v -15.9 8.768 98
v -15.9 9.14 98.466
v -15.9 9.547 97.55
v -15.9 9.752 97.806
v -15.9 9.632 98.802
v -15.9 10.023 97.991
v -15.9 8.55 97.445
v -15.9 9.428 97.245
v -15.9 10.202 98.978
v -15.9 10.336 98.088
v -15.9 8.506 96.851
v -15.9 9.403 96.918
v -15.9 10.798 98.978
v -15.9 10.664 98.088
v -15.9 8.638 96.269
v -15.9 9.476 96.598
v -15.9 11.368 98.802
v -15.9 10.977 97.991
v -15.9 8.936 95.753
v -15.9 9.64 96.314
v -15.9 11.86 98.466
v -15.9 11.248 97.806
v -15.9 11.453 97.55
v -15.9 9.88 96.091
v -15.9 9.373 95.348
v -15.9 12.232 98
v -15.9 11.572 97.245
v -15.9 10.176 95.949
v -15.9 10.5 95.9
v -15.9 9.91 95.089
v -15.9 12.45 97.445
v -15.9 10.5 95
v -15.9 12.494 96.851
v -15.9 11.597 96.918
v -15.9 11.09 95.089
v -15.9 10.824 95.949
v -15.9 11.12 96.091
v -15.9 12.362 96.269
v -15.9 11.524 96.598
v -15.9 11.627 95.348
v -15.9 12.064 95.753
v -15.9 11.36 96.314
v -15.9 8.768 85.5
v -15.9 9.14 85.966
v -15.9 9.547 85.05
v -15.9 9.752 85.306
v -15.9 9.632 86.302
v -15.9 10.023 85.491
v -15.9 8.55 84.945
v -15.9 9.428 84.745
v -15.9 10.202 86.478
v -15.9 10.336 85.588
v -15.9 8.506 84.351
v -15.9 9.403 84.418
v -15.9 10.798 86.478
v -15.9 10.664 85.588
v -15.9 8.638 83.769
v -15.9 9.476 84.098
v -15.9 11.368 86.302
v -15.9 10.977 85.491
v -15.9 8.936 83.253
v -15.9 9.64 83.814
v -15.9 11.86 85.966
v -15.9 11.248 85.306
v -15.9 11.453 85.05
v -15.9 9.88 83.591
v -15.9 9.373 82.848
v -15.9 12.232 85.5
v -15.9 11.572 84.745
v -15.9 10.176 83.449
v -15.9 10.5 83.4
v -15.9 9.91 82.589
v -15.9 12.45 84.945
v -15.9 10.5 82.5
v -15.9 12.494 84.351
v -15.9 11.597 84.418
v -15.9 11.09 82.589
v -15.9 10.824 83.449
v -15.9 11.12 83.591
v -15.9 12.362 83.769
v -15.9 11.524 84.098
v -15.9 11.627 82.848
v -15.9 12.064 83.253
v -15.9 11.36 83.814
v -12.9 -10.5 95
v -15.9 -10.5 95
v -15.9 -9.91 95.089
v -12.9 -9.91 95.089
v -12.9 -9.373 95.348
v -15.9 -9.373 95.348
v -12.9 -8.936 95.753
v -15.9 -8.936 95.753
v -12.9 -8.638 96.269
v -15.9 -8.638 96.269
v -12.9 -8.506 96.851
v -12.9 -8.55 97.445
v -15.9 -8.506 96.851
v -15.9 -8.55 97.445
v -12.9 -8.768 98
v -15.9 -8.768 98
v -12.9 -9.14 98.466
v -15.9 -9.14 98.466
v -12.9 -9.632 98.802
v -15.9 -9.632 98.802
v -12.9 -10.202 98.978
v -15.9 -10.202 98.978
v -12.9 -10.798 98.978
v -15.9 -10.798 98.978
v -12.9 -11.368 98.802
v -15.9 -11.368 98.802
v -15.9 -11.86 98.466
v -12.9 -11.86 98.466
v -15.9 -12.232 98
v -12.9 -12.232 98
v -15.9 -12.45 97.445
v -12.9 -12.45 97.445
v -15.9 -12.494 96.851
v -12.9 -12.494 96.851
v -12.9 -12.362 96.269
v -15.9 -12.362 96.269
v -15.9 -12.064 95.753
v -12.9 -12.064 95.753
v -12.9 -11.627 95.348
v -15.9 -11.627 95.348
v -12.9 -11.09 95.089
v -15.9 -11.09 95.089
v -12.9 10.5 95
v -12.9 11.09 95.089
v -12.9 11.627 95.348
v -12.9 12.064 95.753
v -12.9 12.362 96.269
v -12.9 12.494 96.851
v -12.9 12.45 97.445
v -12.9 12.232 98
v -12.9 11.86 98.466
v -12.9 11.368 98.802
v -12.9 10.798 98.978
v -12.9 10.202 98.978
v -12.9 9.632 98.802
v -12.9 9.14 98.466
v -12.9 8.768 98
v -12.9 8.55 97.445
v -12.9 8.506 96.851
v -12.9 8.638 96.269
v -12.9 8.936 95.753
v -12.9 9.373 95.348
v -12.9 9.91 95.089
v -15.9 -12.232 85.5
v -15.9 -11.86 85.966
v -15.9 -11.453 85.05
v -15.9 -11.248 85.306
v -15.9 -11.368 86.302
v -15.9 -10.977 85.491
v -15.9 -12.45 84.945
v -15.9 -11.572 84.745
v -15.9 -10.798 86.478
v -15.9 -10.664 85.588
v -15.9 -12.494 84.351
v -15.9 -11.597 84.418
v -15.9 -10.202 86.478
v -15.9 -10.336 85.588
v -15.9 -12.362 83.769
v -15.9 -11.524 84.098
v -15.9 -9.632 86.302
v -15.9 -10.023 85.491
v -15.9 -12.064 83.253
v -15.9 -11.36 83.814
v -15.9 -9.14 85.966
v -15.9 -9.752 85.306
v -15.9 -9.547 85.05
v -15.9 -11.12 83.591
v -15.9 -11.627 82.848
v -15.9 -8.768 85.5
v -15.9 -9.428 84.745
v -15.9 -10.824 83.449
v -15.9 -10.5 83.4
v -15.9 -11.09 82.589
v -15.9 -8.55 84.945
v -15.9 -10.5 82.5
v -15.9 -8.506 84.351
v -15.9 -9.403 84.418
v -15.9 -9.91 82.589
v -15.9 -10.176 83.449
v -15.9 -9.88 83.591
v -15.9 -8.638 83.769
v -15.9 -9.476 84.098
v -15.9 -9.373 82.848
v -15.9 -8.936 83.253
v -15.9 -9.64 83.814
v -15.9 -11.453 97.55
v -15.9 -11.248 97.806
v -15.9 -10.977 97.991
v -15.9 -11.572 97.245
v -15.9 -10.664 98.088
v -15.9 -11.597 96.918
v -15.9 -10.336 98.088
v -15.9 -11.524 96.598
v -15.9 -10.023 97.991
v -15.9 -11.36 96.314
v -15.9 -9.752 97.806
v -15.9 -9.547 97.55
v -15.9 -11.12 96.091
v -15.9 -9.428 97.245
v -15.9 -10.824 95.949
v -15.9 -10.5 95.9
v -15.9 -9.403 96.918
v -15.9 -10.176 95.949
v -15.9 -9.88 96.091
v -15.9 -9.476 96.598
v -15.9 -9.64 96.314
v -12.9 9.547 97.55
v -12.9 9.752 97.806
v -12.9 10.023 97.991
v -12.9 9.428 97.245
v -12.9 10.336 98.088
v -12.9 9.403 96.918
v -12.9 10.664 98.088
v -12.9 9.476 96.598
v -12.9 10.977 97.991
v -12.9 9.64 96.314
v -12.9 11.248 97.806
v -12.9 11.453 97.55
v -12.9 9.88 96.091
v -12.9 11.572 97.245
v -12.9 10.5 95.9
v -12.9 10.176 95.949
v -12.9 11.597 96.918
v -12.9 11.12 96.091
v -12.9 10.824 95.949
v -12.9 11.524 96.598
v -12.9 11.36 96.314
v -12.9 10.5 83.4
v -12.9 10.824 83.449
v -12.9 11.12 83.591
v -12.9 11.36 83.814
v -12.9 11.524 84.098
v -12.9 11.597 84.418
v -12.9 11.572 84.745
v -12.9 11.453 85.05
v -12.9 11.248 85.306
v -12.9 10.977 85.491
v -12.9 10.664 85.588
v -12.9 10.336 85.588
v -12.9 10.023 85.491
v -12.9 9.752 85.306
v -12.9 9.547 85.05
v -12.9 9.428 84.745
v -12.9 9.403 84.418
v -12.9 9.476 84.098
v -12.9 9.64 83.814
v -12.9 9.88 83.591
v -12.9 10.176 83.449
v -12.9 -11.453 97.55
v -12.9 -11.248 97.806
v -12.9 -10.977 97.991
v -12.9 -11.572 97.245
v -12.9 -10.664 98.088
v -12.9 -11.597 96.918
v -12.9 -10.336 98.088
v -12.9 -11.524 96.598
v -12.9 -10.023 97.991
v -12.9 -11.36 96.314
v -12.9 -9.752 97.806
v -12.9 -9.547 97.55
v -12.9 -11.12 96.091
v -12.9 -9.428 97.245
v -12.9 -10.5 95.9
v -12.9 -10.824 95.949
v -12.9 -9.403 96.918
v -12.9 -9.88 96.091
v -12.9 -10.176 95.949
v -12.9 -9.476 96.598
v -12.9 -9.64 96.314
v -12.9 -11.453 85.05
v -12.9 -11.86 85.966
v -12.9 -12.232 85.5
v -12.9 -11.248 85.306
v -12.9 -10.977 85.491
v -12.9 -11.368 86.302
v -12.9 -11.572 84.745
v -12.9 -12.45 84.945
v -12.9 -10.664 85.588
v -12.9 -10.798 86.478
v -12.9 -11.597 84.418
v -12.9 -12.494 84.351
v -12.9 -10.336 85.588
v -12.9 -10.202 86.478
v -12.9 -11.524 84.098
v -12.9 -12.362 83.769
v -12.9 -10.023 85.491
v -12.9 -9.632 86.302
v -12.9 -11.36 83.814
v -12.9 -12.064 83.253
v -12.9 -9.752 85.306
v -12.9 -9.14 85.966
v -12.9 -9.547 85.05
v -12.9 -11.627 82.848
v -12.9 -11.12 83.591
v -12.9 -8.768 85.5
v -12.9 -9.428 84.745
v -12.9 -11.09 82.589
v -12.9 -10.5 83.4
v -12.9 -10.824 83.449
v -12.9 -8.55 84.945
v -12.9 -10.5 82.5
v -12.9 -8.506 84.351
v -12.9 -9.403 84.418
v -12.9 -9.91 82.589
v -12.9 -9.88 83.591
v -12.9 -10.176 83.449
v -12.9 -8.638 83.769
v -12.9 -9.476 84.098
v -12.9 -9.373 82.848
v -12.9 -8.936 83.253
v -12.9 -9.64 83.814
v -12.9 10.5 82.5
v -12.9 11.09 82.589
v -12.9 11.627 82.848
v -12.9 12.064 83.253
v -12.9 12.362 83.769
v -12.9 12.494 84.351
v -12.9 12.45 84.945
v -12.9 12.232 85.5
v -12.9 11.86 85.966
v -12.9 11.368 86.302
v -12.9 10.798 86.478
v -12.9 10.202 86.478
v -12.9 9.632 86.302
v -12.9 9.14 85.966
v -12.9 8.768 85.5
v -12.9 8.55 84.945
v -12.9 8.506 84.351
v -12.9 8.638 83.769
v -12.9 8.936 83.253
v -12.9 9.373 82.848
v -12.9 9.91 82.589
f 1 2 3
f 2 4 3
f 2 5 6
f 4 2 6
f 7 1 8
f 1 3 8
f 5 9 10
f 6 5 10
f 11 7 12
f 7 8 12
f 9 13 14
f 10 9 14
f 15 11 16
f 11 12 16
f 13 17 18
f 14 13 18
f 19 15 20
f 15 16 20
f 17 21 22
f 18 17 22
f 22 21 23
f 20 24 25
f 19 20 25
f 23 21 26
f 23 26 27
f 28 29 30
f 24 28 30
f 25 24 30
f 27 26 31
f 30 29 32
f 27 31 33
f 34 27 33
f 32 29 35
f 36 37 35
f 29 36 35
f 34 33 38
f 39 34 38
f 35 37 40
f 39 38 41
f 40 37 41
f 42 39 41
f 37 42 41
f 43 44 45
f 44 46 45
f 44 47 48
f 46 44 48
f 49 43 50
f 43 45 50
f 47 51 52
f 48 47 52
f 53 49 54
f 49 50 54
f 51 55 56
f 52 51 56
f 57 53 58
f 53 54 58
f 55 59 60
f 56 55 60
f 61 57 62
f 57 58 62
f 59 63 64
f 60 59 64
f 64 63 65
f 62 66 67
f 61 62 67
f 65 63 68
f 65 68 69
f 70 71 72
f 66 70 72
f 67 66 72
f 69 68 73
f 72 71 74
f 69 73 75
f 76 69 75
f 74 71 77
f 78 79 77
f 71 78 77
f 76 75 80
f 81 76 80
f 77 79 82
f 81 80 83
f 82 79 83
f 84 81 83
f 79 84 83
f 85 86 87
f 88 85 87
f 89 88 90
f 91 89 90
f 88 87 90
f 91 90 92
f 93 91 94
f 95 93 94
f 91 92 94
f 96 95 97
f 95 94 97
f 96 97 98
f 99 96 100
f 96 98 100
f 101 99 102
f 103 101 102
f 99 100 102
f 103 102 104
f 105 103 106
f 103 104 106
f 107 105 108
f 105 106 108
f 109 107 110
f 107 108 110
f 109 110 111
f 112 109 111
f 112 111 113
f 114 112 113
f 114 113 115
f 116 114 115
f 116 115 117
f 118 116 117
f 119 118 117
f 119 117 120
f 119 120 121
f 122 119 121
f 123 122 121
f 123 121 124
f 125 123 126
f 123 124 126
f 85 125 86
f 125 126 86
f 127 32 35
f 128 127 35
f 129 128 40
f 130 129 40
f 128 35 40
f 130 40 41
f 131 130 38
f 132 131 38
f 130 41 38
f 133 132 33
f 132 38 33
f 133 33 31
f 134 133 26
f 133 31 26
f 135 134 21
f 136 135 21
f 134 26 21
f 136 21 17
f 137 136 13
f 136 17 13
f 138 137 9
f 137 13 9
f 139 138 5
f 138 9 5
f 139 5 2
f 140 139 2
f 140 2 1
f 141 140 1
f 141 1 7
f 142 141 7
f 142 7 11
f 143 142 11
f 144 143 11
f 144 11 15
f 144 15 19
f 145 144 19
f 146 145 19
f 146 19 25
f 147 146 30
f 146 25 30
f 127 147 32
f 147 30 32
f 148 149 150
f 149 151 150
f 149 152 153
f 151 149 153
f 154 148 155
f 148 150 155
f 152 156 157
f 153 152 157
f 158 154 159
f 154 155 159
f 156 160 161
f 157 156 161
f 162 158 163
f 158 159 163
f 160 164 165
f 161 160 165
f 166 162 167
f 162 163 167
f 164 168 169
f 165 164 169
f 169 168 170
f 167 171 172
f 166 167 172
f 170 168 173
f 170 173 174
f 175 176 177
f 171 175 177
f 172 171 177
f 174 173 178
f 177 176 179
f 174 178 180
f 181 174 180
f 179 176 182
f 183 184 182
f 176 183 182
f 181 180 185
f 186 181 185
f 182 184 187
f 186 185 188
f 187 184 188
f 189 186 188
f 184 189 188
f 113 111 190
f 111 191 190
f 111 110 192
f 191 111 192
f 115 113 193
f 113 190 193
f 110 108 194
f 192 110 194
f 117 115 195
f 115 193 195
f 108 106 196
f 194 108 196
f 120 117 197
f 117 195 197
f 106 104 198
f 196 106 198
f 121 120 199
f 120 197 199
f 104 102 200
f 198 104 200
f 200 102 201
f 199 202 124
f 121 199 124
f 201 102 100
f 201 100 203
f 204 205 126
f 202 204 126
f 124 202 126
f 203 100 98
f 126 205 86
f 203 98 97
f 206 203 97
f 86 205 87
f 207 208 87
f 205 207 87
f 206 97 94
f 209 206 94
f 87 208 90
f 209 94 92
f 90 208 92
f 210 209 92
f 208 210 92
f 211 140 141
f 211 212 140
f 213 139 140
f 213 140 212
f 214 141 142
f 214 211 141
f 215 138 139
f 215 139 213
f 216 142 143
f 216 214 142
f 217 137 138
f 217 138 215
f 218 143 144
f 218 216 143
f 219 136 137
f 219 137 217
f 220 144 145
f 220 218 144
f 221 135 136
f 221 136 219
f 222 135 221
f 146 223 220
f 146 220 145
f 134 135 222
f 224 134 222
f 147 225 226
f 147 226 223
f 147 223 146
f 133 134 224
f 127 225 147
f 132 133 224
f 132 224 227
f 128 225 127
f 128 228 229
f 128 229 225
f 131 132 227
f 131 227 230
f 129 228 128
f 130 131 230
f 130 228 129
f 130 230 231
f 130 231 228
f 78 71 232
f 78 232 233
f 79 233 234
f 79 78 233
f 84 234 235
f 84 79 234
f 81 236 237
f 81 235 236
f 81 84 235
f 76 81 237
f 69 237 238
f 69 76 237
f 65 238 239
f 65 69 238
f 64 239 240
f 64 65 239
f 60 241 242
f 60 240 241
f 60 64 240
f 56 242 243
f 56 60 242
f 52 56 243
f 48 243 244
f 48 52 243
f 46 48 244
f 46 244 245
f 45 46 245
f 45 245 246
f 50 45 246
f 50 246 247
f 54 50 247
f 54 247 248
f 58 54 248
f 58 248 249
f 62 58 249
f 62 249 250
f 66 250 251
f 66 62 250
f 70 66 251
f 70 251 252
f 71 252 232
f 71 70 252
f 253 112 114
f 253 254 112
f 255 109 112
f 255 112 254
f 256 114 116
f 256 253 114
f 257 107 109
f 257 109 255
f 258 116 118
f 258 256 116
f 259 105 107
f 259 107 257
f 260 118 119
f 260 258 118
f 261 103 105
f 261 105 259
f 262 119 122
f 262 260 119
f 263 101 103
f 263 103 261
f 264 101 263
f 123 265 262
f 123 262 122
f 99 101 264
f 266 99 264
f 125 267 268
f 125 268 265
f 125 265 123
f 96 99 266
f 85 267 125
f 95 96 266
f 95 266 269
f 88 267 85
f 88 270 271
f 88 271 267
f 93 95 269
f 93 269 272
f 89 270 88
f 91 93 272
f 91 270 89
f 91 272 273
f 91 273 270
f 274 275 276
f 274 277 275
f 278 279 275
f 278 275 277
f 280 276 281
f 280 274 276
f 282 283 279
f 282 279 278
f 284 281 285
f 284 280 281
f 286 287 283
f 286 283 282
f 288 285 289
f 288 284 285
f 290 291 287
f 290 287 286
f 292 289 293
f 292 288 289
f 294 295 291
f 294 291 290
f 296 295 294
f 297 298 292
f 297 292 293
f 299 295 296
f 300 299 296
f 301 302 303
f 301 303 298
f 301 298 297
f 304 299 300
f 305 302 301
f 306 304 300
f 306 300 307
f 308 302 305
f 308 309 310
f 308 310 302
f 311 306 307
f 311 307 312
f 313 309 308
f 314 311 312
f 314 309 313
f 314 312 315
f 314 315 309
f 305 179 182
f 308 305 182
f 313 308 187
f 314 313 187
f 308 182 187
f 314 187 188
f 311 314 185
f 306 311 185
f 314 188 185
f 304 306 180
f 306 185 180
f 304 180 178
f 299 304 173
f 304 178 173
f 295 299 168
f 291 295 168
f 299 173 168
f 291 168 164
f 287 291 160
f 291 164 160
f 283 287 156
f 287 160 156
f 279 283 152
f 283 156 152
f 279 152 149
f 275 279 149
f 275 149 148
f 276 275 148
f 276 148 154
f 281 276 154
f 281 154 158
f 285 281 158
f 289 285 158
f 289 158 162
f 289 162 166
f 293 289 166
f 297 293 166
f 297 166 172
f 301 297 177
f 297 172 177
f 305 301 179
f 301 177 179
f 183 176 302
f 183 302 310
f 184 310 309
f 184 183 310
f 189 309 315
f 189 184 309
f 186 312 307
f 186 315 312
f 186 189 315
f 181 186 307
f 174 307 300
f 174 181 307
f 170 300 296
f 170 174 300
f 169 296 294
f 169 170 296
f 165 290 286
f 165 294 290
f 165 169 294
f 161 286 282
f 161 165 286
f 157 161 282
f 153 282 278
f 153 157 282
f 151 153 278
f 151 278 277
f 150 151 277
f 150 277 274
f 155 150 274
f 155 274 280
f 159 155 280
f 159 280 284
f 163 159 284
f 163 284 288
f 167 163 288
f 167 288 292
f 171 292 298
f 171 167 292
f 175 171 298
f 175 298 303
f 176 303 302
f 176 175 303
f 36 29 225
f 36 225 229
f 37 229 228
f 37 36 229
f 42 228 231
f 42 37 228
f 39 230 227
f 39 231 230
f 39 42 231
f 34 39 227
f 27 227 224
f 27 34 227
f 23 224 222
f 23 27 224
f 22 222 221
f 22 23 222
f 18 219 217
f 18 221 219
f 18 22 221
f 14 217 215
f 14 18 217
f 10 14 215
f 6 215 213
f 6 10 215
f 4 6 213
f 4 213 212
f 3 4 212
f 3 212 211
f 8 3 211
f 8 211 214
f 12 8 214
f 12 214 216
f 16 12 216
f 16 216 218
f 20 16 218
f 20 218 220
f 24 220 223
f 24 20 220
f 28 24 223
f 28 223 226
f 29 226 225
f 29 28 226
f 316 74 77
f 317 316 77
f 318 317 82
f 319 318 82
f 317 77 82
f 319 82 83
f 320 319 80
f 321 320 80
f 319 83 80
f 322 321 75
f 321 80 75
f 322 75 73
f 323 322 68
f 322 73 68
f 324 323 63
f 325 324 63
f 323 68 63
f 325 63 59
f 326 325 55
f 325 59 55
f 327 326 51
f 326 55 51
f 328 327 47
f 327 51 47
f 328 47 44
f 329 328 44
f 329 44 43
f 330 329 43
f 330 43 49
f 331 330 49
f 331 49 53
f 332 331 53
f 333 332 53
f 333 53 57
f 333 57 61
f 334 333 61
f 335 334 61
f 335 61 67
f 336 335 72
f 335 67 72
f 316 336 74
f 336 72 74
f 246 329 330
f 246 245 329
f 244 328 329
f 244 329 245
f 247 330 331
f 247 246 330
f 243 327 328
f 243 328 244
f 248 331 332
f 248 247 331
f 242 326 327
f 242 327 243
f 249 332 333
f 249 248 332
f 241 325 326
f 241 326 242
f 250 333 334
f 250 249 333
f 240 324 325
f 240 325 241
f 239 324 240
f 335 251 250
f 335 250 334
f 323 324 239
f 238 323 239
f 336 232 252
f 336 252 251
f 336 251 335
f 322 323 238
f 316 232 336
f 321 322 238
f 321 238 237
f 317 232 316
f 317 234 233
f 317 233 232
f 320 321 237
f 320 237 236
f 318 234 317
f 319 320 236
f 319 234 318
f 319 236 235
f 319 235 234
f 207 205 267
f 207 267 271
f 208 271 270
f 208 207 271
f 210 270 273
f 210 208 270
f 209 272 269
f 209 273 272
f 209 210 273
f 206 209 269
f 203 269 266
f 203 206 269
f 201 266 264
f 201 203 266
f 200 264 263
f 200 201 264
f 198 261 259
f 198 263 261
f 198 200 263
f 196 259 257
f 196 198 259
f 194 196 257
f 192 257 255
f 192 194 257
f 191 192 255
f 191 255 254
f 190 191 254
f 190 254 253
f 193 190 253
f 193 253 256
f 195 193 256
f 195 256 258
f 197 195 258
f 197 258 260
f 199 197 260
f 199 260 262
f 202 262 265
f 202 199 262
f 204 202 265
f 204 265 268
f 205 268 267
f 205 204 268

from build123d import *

# Parameters (mm, degrees)
CROQUIS1_R                = 2
SALIENTE_EXTRUIR1_DEPTH   = 3
SALIENTE_EXTRUIR1_2_DEPTH = 3
SALIENTE_EXTRUIR1_3_DEPTH = 3
SALIENTE_EXTRUIR1_4_DEPTH = 3
CROQUIS2_R                = 1.1
CORTAR_EXTRUIR1_DEPTH     = 5


with BuildPart() as part:
    # Croquis1 → Saliente-Extruir1 (new body)
    with BuildSketch(Plane(origin=(-15.9, 0, 0), x_dir=(0, 0, -1), z_dir=(1, 0, 0))):
        with Locations((-97, -10.5)):
            Circle(CROQUIS1_R)
    extrude(amount=SALIENTE_EXTRUIR1_DEPTH)


with BuildPart() as body_2:
    # Croquis1 → Saliente-Extruir1 2 (new body)
    with BuildSketch(Plane(origin=(-15.9, 0, 0), x_dir=(0, 0, -1), z_dir=(1, 0, 0))):
        with Locations((-84.5, -10.5)):
            Circle(CROQUIS1_R)
    extrude(amount=SALIENTE_EXTRUIR1_2_DEPTH)


with BuildPart() as body_3:
    # Croquis1 → Saliente-Extruir1 3 (new body)
    with BuildSketch(Plane(origin=(-15.9, 0, 0), x_dir=(0, 0, -1), z_dir=(1, 0, 0))):
        with Locations((-97, 10.5)):
            Circle(CROQUIS1_R)
    extrude(amount=SALIENTE_EXTRUIR1_3_DEPTH)


with BuildPart() as body_4:
    # Croquis1 → Saliente-Extruir1 4 (new body)
    with BuildSketch(Plane(origin=(-15.9, 0, 0), x_dir=(0, 0, -1), z_dir=(1, 0, 0))):
        with Locations((-84.5, 10.5)):
            Circle(CROQUIS1_R)
    extrude(amount=SALIENTE_EXTRUIR1_4_DEPTH)


with BuildPart() as cortar_extruir1_tool:
    # Croquis2 → Cortar-Extruir1 (new body)
    with BuildSketch(Plane(origin=(-16.9, 0, 0), x_dir=(0, 0, -1), z_dir=(1, 0, 0))):
        with Locations((-97, -10.5)):
            Circle(CROQUIS2_R)
        with Locations((-84.5, -10.5)):
            Circle(CROQUIS2_R)
        with Locations((-97, 10.5)):
            Circle(CROQUIS2_R)
        with Locations((-84.5, 10.5)):
            Circle(CROQUIS2_R)
    extrude(amount=CORTAR_EXTRUIR1_DEPTH)


with BuildPart() as part_1:
    add(part.part)

    # Cortar-Extruir1: cut by cortar_extruir1_tool
    add(cortar_extruir1_tool.part, mode=Mode.SUBTRACT)


with BuildPart() as body_2_1:
    add(body_2.part)

    # Cortar-Extruir1: cut by cortar_extruir1_tool
    add(cortar_extruir1_tool.part, mode=Mode.SUBTRACT)


with BuildPart() as body_3_1:
    add(body_3.part)

    # Cortar-Extruir1: cut by cortar_extruir1_tool
    add(cortar_extruir1_tool.part, mode=Mode.SUBTRACT)


with BuildPart() as body_4_1:
    add(body_4.part)

    # Cortar-Extruir1: cut by cortar_extruir1_tool
    add(cortar_extruir1_tool.part, mode=Mode.SUBTRACT)


solid = Compound([part_1.part, body_2_1.part, body_3_1.part, body_4_1.part])
